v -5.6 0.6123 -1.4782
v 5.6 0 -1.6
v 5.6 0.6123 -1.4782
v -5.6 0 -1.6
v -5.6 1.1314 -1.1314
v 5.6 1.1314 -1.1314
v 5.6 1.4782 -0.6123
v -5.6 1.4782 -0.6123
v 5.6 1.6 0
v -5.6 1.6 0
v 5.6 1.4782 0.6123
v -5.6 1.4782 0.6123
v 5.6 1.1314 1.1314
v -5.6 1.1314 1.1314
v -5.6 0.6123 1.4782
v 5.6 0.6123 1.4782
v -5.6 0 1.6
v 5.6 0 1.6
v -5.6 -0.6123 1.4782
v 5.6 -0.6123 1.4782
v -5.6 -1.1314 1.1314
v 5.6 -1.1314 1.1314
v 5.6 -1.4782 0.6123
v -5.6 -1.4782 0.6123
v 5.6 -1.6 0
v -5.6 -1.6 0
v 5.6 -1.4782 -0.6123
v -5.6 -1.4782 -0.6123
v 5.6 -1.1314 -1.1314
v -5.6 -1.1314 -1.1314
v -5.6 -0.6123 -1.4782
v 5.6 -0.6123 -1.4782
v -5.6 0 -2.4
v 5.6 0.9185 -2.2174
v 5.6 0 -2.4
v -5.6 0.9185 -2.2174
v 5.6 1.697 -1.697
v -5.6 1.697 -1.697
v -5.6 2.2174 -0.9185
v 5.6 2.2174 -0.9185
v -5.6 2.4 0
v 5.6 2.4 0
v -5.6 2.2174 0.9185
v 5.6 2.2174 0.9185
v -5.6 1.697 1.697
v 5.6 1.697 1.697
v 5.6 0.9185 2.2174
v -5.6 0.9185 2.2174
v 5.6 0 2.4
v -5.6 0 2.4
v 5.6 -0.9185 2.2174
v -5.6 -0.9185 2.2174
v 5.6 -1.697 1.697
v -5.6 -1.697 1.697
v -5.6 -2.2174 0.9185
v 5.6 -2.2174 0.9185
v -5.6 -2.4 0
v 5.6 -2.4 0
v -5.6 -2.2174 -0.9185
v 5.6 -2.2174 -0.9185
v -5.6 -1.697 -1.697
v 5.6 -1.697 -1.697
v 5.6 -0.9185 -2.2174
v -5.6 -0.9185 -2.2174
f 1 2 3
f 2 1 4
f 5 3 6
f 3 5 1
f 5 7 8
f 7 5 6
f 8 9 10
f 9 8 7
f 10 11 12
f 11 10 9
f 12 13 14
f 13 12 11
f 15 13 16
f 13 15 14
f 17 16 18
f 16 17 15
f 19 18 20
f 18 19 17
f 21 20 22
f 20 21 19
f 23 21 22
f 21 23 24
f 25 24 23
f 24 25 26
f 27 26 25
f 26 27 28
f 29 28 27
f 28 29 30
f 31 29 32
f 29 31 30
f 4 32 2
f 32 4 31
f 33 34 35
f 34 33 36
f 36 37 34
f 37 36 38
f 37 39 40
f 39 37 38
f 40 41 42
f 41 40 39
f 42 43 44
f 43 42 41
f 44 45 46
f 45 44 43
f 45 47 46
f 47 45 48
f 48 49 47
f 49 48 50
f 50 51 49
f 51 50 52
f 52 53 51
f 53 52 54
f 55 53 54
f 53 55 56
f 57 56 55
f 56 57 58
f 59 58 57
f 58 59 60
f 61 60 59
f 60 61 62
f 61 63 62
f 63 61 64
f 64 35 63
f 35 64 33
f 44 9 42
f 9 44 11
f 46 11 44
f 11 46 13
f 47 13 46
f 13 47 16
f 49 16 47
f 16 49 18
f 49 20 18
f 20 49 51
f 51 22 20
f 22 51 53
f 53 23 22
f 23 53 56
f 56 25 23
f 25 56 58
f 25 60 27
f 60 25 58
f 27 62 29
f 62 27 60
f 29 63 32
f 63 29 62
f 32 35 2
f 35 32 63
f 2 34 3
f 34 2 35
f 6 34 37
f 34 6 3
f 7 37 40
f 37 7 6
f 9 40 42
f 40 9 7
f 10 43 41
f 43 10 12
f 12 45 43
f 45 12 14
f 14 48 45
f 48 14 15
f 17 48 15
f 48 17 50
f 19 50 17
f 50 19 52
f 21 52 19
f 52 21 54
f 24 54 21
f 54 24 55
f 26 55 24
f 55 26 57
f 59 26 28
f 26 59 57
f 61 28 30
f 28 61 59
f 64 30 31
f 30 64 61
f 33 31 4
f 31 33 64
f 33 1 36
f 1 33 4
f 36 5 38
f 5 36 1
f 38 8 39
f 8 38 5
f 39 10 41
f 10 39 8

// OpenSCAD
// file: ../p/4-4disc.scad
use <../lib.scad>
$fa=1; $fs=0.2;
function ldraw_lib__4_4disc(realsolid=false) = [
// 0 Disc 1.0
// 0 Name: 4-4disc.dat
// 0 Author: James Jessiman
// 0 !LDRAW_ORG Primitive UPDATE 2002-02
// 0 !LICENSE Licensed under CC BY 2.0 and CC BY 4.0 : see CAreadme.txt
// 
// 0 BFC CERTIFY CCW
  [0,"BFC","CERTIFY"],
  [0,"BFC","CCW"],
// 
// 0 !HISTORY 1998-12-15 [PTadmin] Official Update 1998-10
// 0 !HISTORY 2002-03-23 [sbliss] Added BFC statement
// 0 !HISTORY 2002-04-25 [PTadmin] Official Update 2002-02
// 0 !HISTORY 2007-06-24 [PTadmin] Header formatted for Contributor Agreement
// 0 !HISTORY 2008-07-01 [PTadmin] Official Update 2008-01
// 
// 
// 3 16 0 0 0 1 0 0 0.9239 0 0.3827
  [3,16,0,0,0,1,0,0,0.9239,0,0.3827],
// 3 16 0 0 0 0.9239 0 0.3827 0.7071 0 0.7071
  [3,16,0,0,0,0.9239,0,0.3827,0.7071,0,0.7071],
// 3 16 0 0 0 0.7071 0 0.7071 0.3827 0 0.9239
  [3,16,0,0,0,0.7071,0,0.7071,0.3827,0,0.9239],
// 3 16 0 0 0 0.3827 0 0.9239 0 0 1
  [3,16,0,0,0,0.3827,0,0.9239,0,0,1],
// 3 16 0 0 0 0 0 1 -0.3827 0 0.9239
  [3,16,0,0,0,0,0,1,-0.3827,0,0.9239],
// 3 16 0 0 0 -0.3827 0 0.9239 -0.7071 0 0.7071
  [3,16,0,0,0,-0.3827,0,0.9239,-0.7071,0,0.7071],
// 3 16 0 0 0 -0.7071 0 0.7071 -0.9239 0 0.3827
  [3,16,0,0,0,-0.7071,0,0.7071,-0.9239,0,0.3827],
// 3 16 0 0 0 -0.9239 0 0.3827 -1 0 -0
  [3,16,0,0,0,-0.9239,0,0.3827,-1,0,-0],
// 3 16 0 0 0 -1 0 -0 -0.9239 0 -0.3827
  [3,16,0,0,0,-1,0,-0,-0.9239,0,-0.3827],
// 3 16 0 0 0 -0.9239 0 -0.3827 -0.7071 0 -0.7071
  [3,16,0,0,0,-0.9239,0,-0.3827,-0.7071,0,-0.7071],
// 3 16 0 0 0 -0.7071 0 -0.7071 -0.3827 0 -0.9239
  [3,16,0,0,0,-0.7071,0,-0.7071,-0.3827,0,-0.9239],
// 3 16 0 0 0 -0.3827 0 -0.9239 0 0 -1
  [3,16,0,0,0,-0.3827,0,-0.9239,0,0,-1],
// 3 16 0 0 0 0 0 -1 0.3827 0 -0.9239
  [3,16,0,0,0,0,0,-1,0.3827,0,-0.9239],
// 3 16 0 0 0 0.3827 0 -0.9239 0.7071 0 -0.7071
  [3,16,0,0,0,0.3827,0,-0.9239,0.7071,0,-0.7071],
// 3 16 0 0 0 0.7071 0 -0.7071 0.9239 0 -0.3827
  [3,16,0,0,0,0.7071,0,-0.7071,0.9239,0,-0.3827],
// 3 16 0 0 0 0.9239 0 -0.3827 1 0 0
  [3,16,0,0,0,0.9239,0,-0.3827,1,0,0],
// 0
];
module ldraw_lib__4_4disc(step=0, col=false, unit=2/5, alt=false, line=0.2, solid=!$preview)
    makepoly(ldraw_lib__4_4disc(solid), step=step, col=col, unit=unit, alt=alt, line=line, solid=solid);
ldraw_lib__4_4disc(line=0.2);
// file: ../p/stud3.scad
use <../lib.scad>
use <4-4cyli.scad>
use <4-4disc.scad>
use <4-4edge.scad>
$fa=1; $fs=0.2;
function ldraw_lib__stud3(realsolid=false) = realsolid ? 
    [openscad(translate([0,0,-eps()], o=cylinder(4+eps(), r=4)),2)] : [
// 0 Stud Tube Solid
// 0 Name: stud3.dat
// 0 Author: James Jessiman
// 0 !LDRAW_ORG Primitive UPDATE 2012-01
// 0 !LICENSE Licensed under CC BY 2.0 and CC BY 4.0 : see CAreadme.txt
// 
// 0 BFC CERTIFY CCW
  [0,"BFC","CERTIFY"],
  [0,"BFC","CCW"],
// 
// 0 !HISTORY 2002-04-04 [sbliss] Modified for BFC compliance
// 0 !HISTORY 2002-04-25 [PTadmin] Official Update 2002-02
// 0 !HISTORY 2007-06-24 [PTadmin] Header formatted for Contributor Agreement
// 0 !HISTORY 2008-07-01 [PTadmin] Official Update 2008-01
// 0 !HISTORY 2012-02-16 [Philo] Changed to CCW
// 0 !HISTORY 2012-03-30 [PTadmin] Official Update 2012-01
// 
// 
// 1 16 0 -4 0 4 0 0 0 1 0 0 0 4 4-4edge.dat
  [1,16,0,-4,0,4,0,0,0,1,0,0,0,4, ldraw_lib__4_4edge(realsolid)],
// 1 16 0 0 0 4 0 0 0 1 0 0 0 4 4-4edge.dat
  [1,16,0,0,0,4,0,0,0,1,0,0,0,4, ldraw_lib__4_4edge(realsolid)],
// 1 16 0 -4 0 4 0 0 0 1 0 0 0 4 4-4disc.dat
  [1,16,0,-4,0,4,0,0,0,1,0,0,0,4, ldraw_lib__4_4disc(realsolid)],
// 1 16 0 -4 0 4 0 0 0 4 0 0 0 4 4-4cyli.dat
  [1,16,0,-4,0,4,0,0,0,4,0,0,0,4, ldraw_lib__4_4cyli(realsolid)],
];
module ldraw_lib__stud3(step=0, col=false, unit=2/5, alt=false, line=0.2, solid=!$preview)
    makepoly(ldraw_lib__stud3(solid), step=step, col=col, unit=unit, alt=alt, line=line, solid=solid);
ldraw_lib__stud3(line=0.2);
// file: ../p/stud.scad
use <../lib.scad>
use <4-4cyli.scad>
use <4-4disc.scad>
use <4-4edge.scad>
$fa=1; $fs=0.2;
function ldraw_lib__stud(realsolid=false) = realsolid ? 
    [openscad(translate([0,0,-eps()], o=cylinder(4+eps(), r=6)),2)] : [
// 0 Stud
// 0 Name: stud.dat
// 0 Author: James Jessiman
// 0 !LDRAW_ORG Primitive UPDATE 2012-01
// 0 !LICENSE Licensed under CC BY 2.0 and CC BY 4.0 : see CAreadme.txt
// 
// 0 BFC CERTIFY CCW
  [0,"BFC","CERTIFY"],
  [0,"BFC","CCW"],
// 
// 0 !HISTORY 2002-04-04 [sbliss] Modified for BFC compliance
// 0 !HISTORY 2002-04-25 [PTadmin] Official Update 2002-02
// 0 !HISTORY 2007-06-24 [PTadmin] Header formatted for Contributor Agreement
// 0 !HISTORY 2008-07-01 [PTadmin] Official Update 2008-01
// 0 !HISTORY 2012-02-16 [Philo] Changed to CCW
// 0 !HISTORY 2012-03-30 [PTadmin] Official Update 2012-01
// 
// 
// 1 16 0 0 0 6 0 0 0 1 0 0 0 6 4-4edge.dat
  [1,16,0,0,0,6,0,0,0,1,0,0,0,6, ldraw_lib__4_4edge(realsolid)],
// 1 16 0 -4 0 6 0 0 0 1 0 0 0 6 4-4edge.dat
  [1,16,0,-4,0,6,0,0,0,1,0,0,0,6, ldraw_lib__4_4edge(realsolid)],
// 1 16 0 0 0 6 0 0 0 -4 0 0 0 6 4-4cyli.dat
  [1,16,0,0,0,6,0,0,0,-4,0,0,0,6, ldraw_lib__4_4cyli(realsolid)],
// 1 16 0 -4 0 6 0 0 0 1 0 0 0 6 4-4disc.dat
  [1,16,0,-4,0,6,0,0,0,1,0,0,0,6, ldraw_lib__4_4disc(realsolid)],
];
module ldraw_lib__stud(step=0, col=false, unit=2/5, alt=false, line=0.2, solid=!$preview)
    makepoly(ldraw_lib__stud(solid), step=step, col=col, unit=unit, alt=alt, line=line, solid=solid);
ldraw_lib__stud(line=0.2);
// file: ../p/box5.scad
use <../lib.scad>
$fa=1; $fs=0.2;
function ldraw_lib__box5(realsolid=false) = [
// 0 Box with 5 Faces and All Edges
// 0 Name: box5.dat
// 0 Author: James Jessiman
// 0 !LDRAW_ORG Primitive UPDATE 2012-01
// 0 !LICENSE Licensed under CC BY 2.0 and CC BY 4.0 : see CAreadme.txt
// 
// 0 BFC CERTIFY CCW
  [0,"BFC","CERTIFY"],
  [0,"BFC","CCW"],
// 
// 0 !HISTORY 2002-04-03 [sbliss] Modified for BFC compliance
// 0 !HISTORY 2002-04-25 [PTadmin] Official Update 2002-02
// 0 !HISTORY 2007-06-24 [PTadmin] Header formatted for Contributor Agreement
// 0 !HISTORY 2008-07-01 [PTadmin] Official Update 2008-01
// 0 !HISTORY 2012-02-16 [Philo] Changed to CCW
// 0 !HISTORY 2012-03-30 [PTadmin] Official Update 2012-01
// 
// 
// 2 24 1 1 1 -1 1 1
  [2,24,1,1,1,-1,1,1],
// 2 24 -1 1 1 -1 1 -1
  [2,24,-1,1,1,-1,1,-1],
// 2 24 -1 1 -1 1 1 -1
  [2,24,-1,1,-1,1,1,-1],
// 2 24 1 1 -1 1 1 1
  [2,24,1,1,-1,1,1,1],
// 2 24 1 0 1 -1 0 1
  [2,24,1,0,1,-1,0,1],
// 2 24 -1 0 1 -1 0 -1
  [2,24,-1,0,1,-1,0,-1],
// 2 24 -1 0 -1 1 0 -1
  [2,24,-1,0,-1,1,0,-1],
// 2 24 1 0 -1 1 0 1
  [2,24,1,0,-1,1,0,1],
// 2 24 1 0 1 1 1 1
  [2,24,1,0,1,1,1,1],
// 2 24 -1 0 1 -1 1 1
  [2,24,-1,0,1,-1,1,1],
// 2 24 1 0 -1 1 1 -1
  [2,24,1,0,-1,1,1,-1],
// 2 24 -1 0 -1 -1 1 -1
  [2,24,-1,0,-1,-1,1,-1],
// 4 16 -1 1 1 1 1 1 1 1 -1 -1 1 -1
  [4,16,-1,1,1,1,1,1,1,1,-1,-1,1,-1],
// 4 16 -1 1 1 -1 0 1 1 0 1 1 1 1
  [4,16,-1,1,1,-1,0,1,1,0,1,1,1,1],
// 4 16 -1 1 -1 -1 0 -1 -1 0 1 -1 1 1
  [4,16,-1,1,-1,-1,0,-1,-1,0,1,-1,1,1],
// 4 16 1 1 -1 1 0 -1 -1 0 -1 -1 1 -1
  [4,16,1,1,-1,1,0,-1,-1,0,-1,-1,1,-1],
// 4 16 1 1 1 1 0 1 1 0 -1 1 1 -1
  [4,16,1,1,1,1,0,1,1,0,-1,1,1,-1],
];
module ldraw_lib__box5(step=0, col=false, unit=2/5, alt=false, line=0.2, solid=!$preview)
    makepoly(ldraw_lib__box5(solid), step=step, col=col, unit=unit, alt=alt, line=line, solid=solid);
ldraw_lib__box5(line=0.2);
// file: ../p/box4t.scad
use <../lib.scad>
$fa=1; $fs=0.2;
function ldraw_lib__box4t(realsolid=false) = [
// 0 Box with 4 Adjacent Faces and All Edges
// 0 Name: box4t.dat
// 0 Author: Tore Eriksson [Tore_Eriksson]
// 0 !LDRAW_ORG Primitive UPDATE 2003-02
// 0 !LICENSE Licensed under CC BY 2.0 and CC BY 4.0 : see CAreadme.txt
// 
// 0 BFC CERTIFY CCW
  [0,"BFC","CERTIFY"],
  [0,"BFC","CCW"],
// 
// 0 !HISTORY 1997-09-29 [PTadmin] Official Update 1997-15
// 0 !HISTORY 2002-08-31 [izanette] Modified with WINDZ for BFC compliance
// 0 !HISTORY 2003-08-01 [PTadmin] Official Update 2003-02
// 0 !HISTORY 2007-06-24 [PTadmin] Header formatted for Contributor Agreement
// 0 !HISTORY 2008-07-01 [PTadmin] Official Update 2008-01
// 
// 
// 2 24 1 1 1 -1 1 1
  [2,24,1,1,1,-1,1,1],
// 2 24 -1 1 1 -1 1 -1
  [2,24,-1,1,1,-1,1,-1],
// 2 24 -1 1 -1 1 1 -1
  [2,24,-1,1,-1,1,1,-1],
// 2 24 1 1 -1 1 1 1
  [2,24,1,1,-1,1,1,1],
// 2 24 1 0 1 -1 0 1
  [2,24,1,0,1,-1,0,1],
// 2 24 -1 0 1 -1 0 -1
  [2,24,-1,0,1,-1,0,-1],
// 2 24 -1 0 -1 1 0 -1
  [2,24,-1,0,-1,1,0,-1],
// 2 24 1 0 -1 1 0 1
  [2,24,1,0,-1,1,0,1],
// 2 24 1 0 1 1 1 1
  [2,24,1,0,1,1,1,1],
// 2 24 -1 0 1 -1 1 1
  [2,24,-1,0,1,-1,1,1],
// 2 24 1 0 -1 1 1 -1
  [2,24,1,0,-1,1,1,-1],
// 2 24 -1 0 -1 -1 1 -1
  [2,24,-1,0,-1,-1,1,-1],
// 4 16 1 1 1 1 1 -1 -1 1 -1 -1 1 1
  [4,16,1,1,1,1,1,-1,-1,1,-1,-1,1,1],
// 4 16 1 1 1 -1 1 1 -1 0 1 1 0 1
  [4,16,1,1,1,-1,1,1,-1,0,1,1,0,1],
// 4 16 -1 1 1 -1 1 -1 -1 0 -1 -1 0 1
  [4,16,-1,1,1,-1,1,-1,-1,0,-1,-1,0,1],
// 0 4 16 -1 1 -1 -1 0 -1 1 0 -1 1 1 -1
// 4 16 1 1 -1 1 1 1 1 0 1 1 0 -1
  [4,16,1,1,-1,1,1,1,1,0,1,1,0,-1],
// 0
];
module ldraw_lib__box4t(step=0, col=false, unit=2/5, alt=false, line=0.2, solid=!$preview)
    makepoly(ldraw_lib__box4t(solid), step=step, col=col, unit=unit, alt=alt, line=line, solid=solid);
ldraw_lib__box4t(line=0.2);
// file: s/3004s01.scad
use <../../lib.scad>
use <../../p/box4t.scad>
use <../../p/box5.scad>
use <../../p/stud.scad>
use <../../p/stud3.scad>
$fa=1; $fs=0.2;
function ldraw_lib__s__3004s01(realsolid=false) = [
// 0 ~Brick  1 x  2 without Front Face
// 0 Name: s\3004s01.dat
// 0 Author: James Jessiman
// 0 !LDRAW_ORG Subpart UPDATE 2003-03
// 0 !LICENSE Licensed under CC BY 2.0 and CC BY 4.0 : see CAreadme.txt
// 
// 0 BFC CERTIFY CCW
  [0,"BFC","CERTIFY"],
  [0,"BFC","CCW"],
// 
// 0 !HISTORY 2003-09-07 [jriley] Subfiling, BFC
// 0 !HISTORY 2003-12-19 [PTadmin] Official Update 2003-03
// 0 !HISTORY 2007-08-29 [PTadmin] Header formatted for Contributor Agreement
// 0 !HISTORY 2008-07-01 [PTadmin] Official Update 2008-01
// 
// 
// 1 16 0 4 0 1 0 0 0 -5 0 0 0 1 stud3.dat
  [1,16,0,4,0,1,0,0,0,-5,0,0,0,1, ldraw_lib__stud3(realsolid)],
// 0 BFC INVERTNEXT
  [0,"BFC","INVERTNEXT"],
// 1 16 0 24 0 16 0 0 0 -20 0 0 0 6 box5.dat
  [1,16,0,24,0,16,0,0,0,-20,0,0,0,6, ldraw_lib__box5(realsolid)],
// 4 16 20 24 10 16 24 6 -16 24 6 -20 24 10
  [4,16,20,24,10,16,24,6,-16,24,6,-20,24,10],
// 4 16 -20 24 10 -16 24 6 -16 24 -6 -20 24 -10
  [4,16,-20,24,10,-16,24,6,-16,24,-6,-20,24,-10],
// 4 16 -20 24 -10 -16 24 -6 16 24 -6 20 24 -10
  [4,16,-20,24,-10,-16,24,-6,16,24,-6,20,24,-10],
// 4 16 20 24 -10 16 24 -6 16 24 6 20 24 10
  [4,16,20,24,-10,16,24,-6,16,24,6,20,24,10],
// 1 16 0 24 0 20 0 0 0 -24 0 0 0 10 box4t.dat
  [1,16,0,24,0,20,0,0,0,-24,0,0,0,10, ldraw_lib__box4t(realsolid)],
// 1 16 10 0 0 1 0 0 0 1 0 0 0 1 stud.dat
  [1,16,10,0,0,1,0,0,0,1,0,0,0,1, ldraw_lib__stud(realsolid)],
// 1 16 -10 0 0 1 0 0 0 1 0 0 0 1 stud.dat
  [1,16,-10,0,0,1,0,0,0,1,0,0,0,1, ldraw_lib__stud(realsolid)],
// 0
];
module ldraw_lib__s__3004s01(step=0, col=false, unit=2/5, alt=false, line=0.2, solid=!$preview)
    makepoly(ldraw_lib__s__3004s01(solid), step=step, col=col, unit=unit, alt=alt, line=line, solid=solid);
ldraw_lib__s__3004s01(line=0.2);
// file: ../p/4-4ring2.scad
use <../lib.scad>
$fa=1; $fs=0.2;
function ldraw_lib__4_4ring2(realsolid=false) = [
// 0 Ring  2 x 1.0
// 0 Name: 4-4ring2.dat
// 0 Author: James Jessiman
// 0 !LDRAW_ORG Primitive UPDATE 2009-01
// 0 !LICENSE Licensed under CC BY 2.0 and CC BY 4.0 : see CAreadme.txt
// 
// 0 BFC CERTIFY CCW
  [0,"BFC","CERTIFY"],
  [0,"BFC","CCW"],
// 
// 0 !HISTORY 1998-12-15 [PTadmin] Official Update 1998-10
// 0 !HISTORY 2002-04-05 [hafhead] Added BFC statement
// 0 !HISTORY 2002-04-25 [PTadmin] Official Update 2002-02
// 0 !HISTORY 2007-06-24 [PTadmin] Header formatted for Contributor Agreement
// 0 !HISTORY 2008-07-01 [PTadmin] Official Update 2008-01
// 0 !HISTORY 2008-08-26 [cwdee] Switch polygon winding and rename
// 0 !HISTORY 2009-05-02 [PTadmin] Official Update 2009-01
// 
// 
// 4 16 -1.1481 0 2.7717 -0.7654 0 1.8478 0 0 2 0 0 3
  [4,16,-1.1481,0,2.7717,-0.7654,0,1.8478,0,0,2,0,0,3],
// 4 16 -2.1213 0 2.1213 -1.4142 0 1.4142 -0.7654 0 1.8478 -1.1481 0 2.7717
  [4,16,-2.1213,0,2.1213,-1.4142,0,1.4142,-0.7654,0,1.8478,-1.1481,0,2.7717],
// 4 16 -2.7717 0 1.1481 -1.8478 0 0.7654 -1.4142 0 1.4142 -2.1213 0 2.1213
  [4,16,-2.7717,0,1.1481,-1.8478,0,0.7654,-1.4142,0,1.4142,-2.1213,0,2.1213],
// 4 16 -3 0 0 -2 0 0 -1.8478 0 0.7654 -2.7717 0 1.1481
  [4,16,-3,0,0,-2,0,0,-1.8478,0,0.7654,-2.7717,0,1.1481],
// 4 16 -2.7717 0 -1.1481 -1.8478 0 -0.7654 -2 0 0 -3 0 0
  [4,16,-2.7717,0,-1.1481,-1.8478,0,-0.7654,-2,0,0,-3,0,0],
// 4 16 -2.1213 0 -2.1213 -1.4142 0 -1.4142 -1.8478 0 -0.7654 -2.7717 0 -1.1481
  [4,16,-2.1213,0,-2.1213,-1.4142,0,-1.4142,-1.8478,0,-0.7654,-2.7717,0,-1.1481],
// 4 16 -1.1481 0 -2.7717 -0.7654 0 -1.8478 -1.4142 0 -1.4142 -2.1213 0 -2.1213
  [4,16,-1.1481,0,-2.7717,-0.7654,0,-1.8478,-1.4142,0,-1.4142,-2.1213,0,-2.1213],
// 4 16 0 0 -3 0 0 -2 -0.7654 0 -1.8478 -1.1481 0 -2.7717
  [4,16,0,0,-3,0,0,-2,-0.7654,0,-1.8478,-1.1481,0,-2.7717],
// 4 16 1.1481 0 -2.7717 0.7654 0 -1.8478 0 0 -2 0 0 -3
  [4,16,1.1481,0,-2.7717,0.7654,0,-1.8478,0,0,-2,0,0,-3],
// 4 16 2.1213 0 -2.1213 1.4142 0 -1.4142 0.7654 0 -1.8478 1.1481 0 -2.7717
  [4,16,2.1213,0,-2.1213,1.4142,0,-1.4142,0.7654,0,-1.8478,1.1481,0,-2.7717],
// 4 16 2.7717 0 -1.1481 1.8478 0 -0.7654 1.4142 0 -1.4142 2.1213 0 -2.1213
  [4,16,2.7717,0,-1.1481,1.8478,0,-0.7654,1.4142,0,-1.4142,2.1213,0,-2.1213],
// 4 16 3 0 0 2 0 0 1.8478 0 -0.7654 2.7717 0 -1.1481
  [4,16,3,0,0,2,0,0,1.8478,0,-0.7654,2.7717,0,-1.1481],
// 4 16 2.7717 0 1.1481 1.8478 0 0.7654 2 0 0 3 0 0
  [4,16,2.7717,0,1.1481,1.8478,0,0.7654,2,0,0,3,0,0],
// 4 16 2.1213 0 2.1213 1.4142 0 1.4142 1.8478 0 0.7654 2.7717 0 1.1481
  [4,16,2.1213,0,2.1213,1.4142,0,1.4142,1.8478,0,0.7654,2.7717,0,1.1481],
// 4 16 1.1481 0 2.7717 0.7654 0 1.8478 1.4142 0 1.4142 2.1213 0 2.1213
  [4,16,1.1481,0,2.7717,0.7654,0,1.8478,1.4142,0,1.4142,2.1213,0,2.1213],
// 4 16 0 0 3 0 0 2 0.7654 0 1.8478 1.1481 0 2.7717
  [4,16,0,0,3,0,0,2,0.7654,0,1.8478,1.1481,0,2.7717],
// 0
];
module ldraw_lib__4_4ring2(step=0, col=false, unit=2/5, alt=false, line=0.2, solid=!$preview)
    makepoly(ldraw_lib__4_4ring2(solid), step=step, col=col, unit=unit, alt=alt, line=line, solid=solid);
ldraw_lib__4_4ring2(line=0.2);
// file: ../p/4-4edge.scad
use <../lib.scad>
$fa=1; $fs=0.2;
function ldraw_lib__4_4edge(realsolid=false) = [
// 0 Circle 1.0
// 0 Name: 4-4edge.dat
// 0 Author: James Jessiman
// 0 !LDRAW_ORG Primitive UPDATE 2017-01
// 0 !LICENSE Licensed under CC BY 2.0 and CC BY 4.0 : see CAreadme.txt
// 
// 0 BFC CERTIFY CCW
  [0,"BFC","CERTIFY"],
  [0,"BFC","CCW"],
// 
// 0 !HISTORY 1998-12-15 [PTadmin] Official Update 1998-10
// 0 !HISTORY 2005-12-28 [PTadmin] Official Update 2005-01
// 0 !HISTORY 2007-06-24 [PTadmin] Header formatted for Contributor Agreement
// 0 !HISTORY 2008-07-01 [PTadmin] Official Update 2008-01
// 0 !HISTORY 2017-01-15 [Steffen] BFCed
// 0 !HISTORY 2017-12-30 [PTadmin] Official Update 2017-01
// 
// 
// 2 24 1 0 0 0.9239 0 0.3827
  [2,24,1,0,0,0.9239,0,0.3827],
// 2 24 0.9239 0 0.3827 0.7071 0 0.7071
  [2,24,0.9239,0,0.3827,0.7071,0,0.7071],
// 2 24 0.7071 0 0.7071 0.3827 0 0.9239
  [2,24,0.7071,0,0.7071,0.3827,0,0.9239],
// 2 24 0.3827 0 0.9239 0 0 1
  [2,24,0.3827,0,0.9239,0,0,1],
// 2 24 0 0 1 -0.3827 0 0.9239
  [2,24,0,0,1,-0.3827,0,0.9239],
// 2 24 -0.3827 0 0.9239 -0.7071 0 0.7071
  [2,24,-0.3827,0,0.9239,-0.7071,0,0.7071],
// 2 24 -0.7071 0 0.7071 -0.9239 0 0.3827
  [2,24,-0.7071,0,0.7071,-0.9239,0,0.3827],
// 2 24 -0.9239 0 0.3827 -1 0 -0
  [2,24,-0.9239,0,0.3827,-1,0,-0],
// 2 24 -1 0 -0 -0.9239 0 -0.3827
  [2,24,-1,0,-0,-0.9239,0,-0.3827],
// 2 24 -0.9239 0 -0.3827 -0.7071 0 -0.7071
  [2,24,-0.9239,0,-0.3827,-0.7071,0,-0.7071],
// 2 24 -0.7071 0 -0.7071 -0.3827 0 -0.9239
  [2,24,-0.7071,0,-0.7071,-0.3827,0,-0.9239],
// 2 24 -0.3827 0 -0.9239 0 0 -1
  [2,24,-0.3827,0,-0.9239,0,0,-1],
// 2 24 0 0 -1 0.3827 0 -0.9239
  [2,24,0,0,-1,0.3827,0,-0.9239],
// 2 24 0.3827 0 -0.9239 0.7071 0 -0.7071
  [2,24,0.3827,0,-0.9239,0.7071,0,-0.7071],
// 2 24 0.7071 0 -0.7071 0.9239 0 -0.3827
  [2,24,0.7071,0,-0.7071,0.9239,0,-0.3827],
// 2 24 0.9239 0 -0.3827 1 0 0
  [2,24,0.9239,0,-0.3827,1,0,0],
];
module ldraw_lib__4_4edge(step=0, col=false, unit=2/5, alt=false, line=0.2, solid=!$preview)
    makepoly(ldraw_lib__4_4edge(solid), step=step, col=col, unit=unit, alt=alt, line=line, solid=solid);
ldraw_lib__4_4edge(line=0.2);
// file: ../p/4-4cyli.scad
use <../lib.scad>
$fa=1; $fs=0.2;
function ldraw_lib__4_4cyli(realsolid=false) = [
// 0 Cylinder 1.0
// 0 Name: 4-4cyli.dat
// 0 Author: James Jessiman
// 0 !LDRAW_ORG Primitive UPDATE 2005-01
// 0 !LICENSE Licensed under CC BY 2.0 and CC BY 4.0 : see CAreadme.txt
// 
// 0 BFC CERTIFY CCW
  [0,"BFC","CERTIFY"],
  [0,"BFC","CCW"],
// 
// 0 !HISTORY 1998-12-15 [PTadmin] Official Update 1998-10
// 0 !HISTORY 2002-03-23 [sbliss] Added BFC statement; merged headers from files in distributions LDraw 0.27 and Complete.
// 0 !HISTORY 2002-04-25 [PTadmin] Official Update 2002-02
// 0 !HISTORY 2004-12-14 [guyvivan] BFC CCW
// 0 !HISTORY 2005-12-28 [PTadmin] Official Update 2005-01
// 0 !HISTORY 2007-06-24 [PTadmin] Header formatted for Contributor Agreement
// 0 !HISTORY 2008-07-01 [PTadmin] Official Update 2008-01
// 
// 
// 4 16 1 1 0 0.9239 1 0.3827 0.9239 0 0.3827 1 0 0
  [4,16,1,1,0,0.9239,1,0.3827,0.9239,0,0.3827,1,0,0],
// 5 24 1 0 0 1 1 0 0.9239 0 0.3827 0.9239 0 -0.3827
  [5,24,1,0,0,1,1,0,0.9239,0,0.3827,0.9239,0,-0.3827],
// 4 16 0.9239 1 0.3827 0.7071 1 0.7071 0.7071 0 0.7071 0.9239 0 0.3827
  [4,16,0.9239,1,0.3827,0.7071,1,0.7071,0.7071,0,0.7071,0.9239,0,0.3827],
// 5 24 0.9239 0 0.3827 0.9239 1 0.3827 0.7071 0 0.7071 1 0 0
  [5,24,0.9239,0,0.3827,0.9239,1,0.3827,0.7071,0,0.7071,1,0,0],
// 4 16 0.7071 1 0.7071 0.3827 1 0.9239 0.3827 0 0.9239 0.7071 0 0.7071
  [4,16,0.7071,1,0.7071,0.3827,1,0.9239,0.3827,0,0.9239,0.7071,0,0.7071],
// 5 24 0.7071 0 0.7071 0.7071 1 0.7071 0.3827 0 0.9239 0.9239 0 0.3827
  [5,24,0.7071,0,0.7071,0.7071,1,0.7071,0.3827,0,0.9239,0.9239,0,0.3827],
// 4 16 0.3827 1 0.9239 0 1 1 0 0 1 0.3827 0 0.9239
  [4,16,0.3827,1,0.9239,0,1,1,0,0,1,0.3827,0,0.9239],
// 5 24 0.3827 0 0.9239 0.3827 1 0.9239 0 0 1 0.7071 0 0.7071
  [5,24,0.3827,0,0.9239,0.3827,1,0.9239,0,0,1,0.7071,0,0.7071],
// 4 16 0 1 1 -0.3827 1 0.9239 -0.3827 0 0.9239 0 0 1
  [4,16,0,1,1,-0.3827,1,0.9239,-0.3827,0,0.9239,0,0,1],
// 5 24 0 0 1 0 1 1 -0.3827 0 0.9239 0.3827 0 0.9239
  [5,24,0,0,1,0,1,1,-0.3827,0,0.9239,0.3827,0,0.9239],
// 4 16 -0.3827 1 0.9239 -0.7071 1 0.7071 -0.7071 0 0.7071 -0.3827 0 0.9239
  [4,16,-0.3827,1,0.9239,-0.7071,1,0.7071,-0.7071,0,0.7071,-0.3827,0,0.9239],
// 5 24 -0.3827 0 0.9239 -0.3827 1 0.9239 -0.7071 0 0.7071 0 0 1
  [5,24,-0.3827,0,0.9239,-0.3827,1,0.9239,-0.7071,0,0.7071,0,0,1],
// 4 16 -0.7071 1 0.7071 -0.9239 1 0.3827 -0.9239 0 0.3827 -0.7071 0 0.7071
  [4,16,-0.7071,1,0.7071,-0.9239,1,0.3827,-0.9239,0,0.3827,-0.7071,0,0.7071],
// 5 24 -0.7071 0 0.7071 -0.7071 1 0.7071 -0.9239 0 0.3827 -0.3827 0 0.9239
  [5,24,-0.7071,0,0.7071,-0.7071,1,0.7071,-0.9239,0,0.3827,-0.3827,0,0.9239],
// 4 16 -0.9239 1 0.3827 -1 1 0 -1 0 0 -0.9239 0 0.3827
  [4,16,-0.9239,1,0.3827,-1,1,0,-1,0,0,-0.9239,0,0.3827],
// 5 24 -0.9239 0 0.3827 -0.9239 1 0.3827 -1 0 0 -0.7071 0 0.7071
  [5,24,-0.9239,0,0.3827,-0.9239,1,0.3827,-1,0,0,-0.7071,0,0.7071],
// 4 16 -1 1 0 -0.9239 1 -0.3827 -0.9239 0 -0.3827 -1 0 0
  [4,16,-1,1,0,-0.9239,1,-0.3827,-0.9239,0,-0.3827,-1,0,0],
// 5 24 -1 0 0 -1 1 0 -0.9239 0 -0.3827 -0.9239 0 0.3827
  [5,24,-1,0,0,-1,1,0,-0.9239,0,-0.3827,-0.9239,0,0.3827],
// 4 16 -0.9239 1 -0.3827 -0.7071 1 -0.7071 -0.7071 0 -0.7071 -0.9239 0 -0.3827
  [4,16,-0.9239,1,-0.3827,-0.7071,1,-0.7071,-0.7071,0,-0.7071,-0.9239,0,-0.3827],
// 5 24 -0.9239 0 -0.3827 -0.9239 1 -0.3827 -0.7071 0 -0.7071 -1 0 0
  [5,24,-0.9239,0,-0.3827,-0.9239,1,-0.3827,-0.7071,0,-0.7071,-1,0,0],
// 4 16 -0.7071 1 -0.7071 -0.3827 1 -0.9239 -0.3827 0 -0.9239 -0.7071 0 -0.7071
  [4,16,-0.7071,1,-0.7071,-0.3827,1,-0.9239,-0.3827,0,-0.9239,-0.7071,0,-0.7071],
// 5 24 -0.7071 0 -0.7071 -0.7071 1 -0.7071 -0.3827 0 -0.9239 -0.9239 0 -0.3827
  [5,24,-0.7071,0,-0.7071,-0.7071,1,-0.7071,-0.3827,0,-0.9239,-0.9239,0,-0.3827],
// 4 16 -0.3827 1 -0.9239 0 1 -1 0 0 -1 -0.3827 0 -0.9239
  [4,16,-0.3827,1,-0.9239,0,1,-1,0,0,-1,-0.3827,0,-0.9239],
// 5 24 -0.3827 0 -0.9239 -0.3827 1 -0.9239 0 0 -1 -0.7071 0 -0.7071
  [5,24,-0.3827,0,-0.9239,-0.3827,1,-0.9239,0,0,-1,-0.7071,0,-0.7071],
// 4 16 0 1 -1 0.3827 1 -0.9239 0.3827 0 -0.9239 0 0 -1
  [4,16,0,1,-1,0.3827,1,-0.9239,0.3827,0,-0.9239,0,0,-1],
// 5 24 0 0 -1 0 1 -1 0.3827 0 -0.9239 -0.3827 0 -0.9239
  [5,24,0,0,-1,0,1,-1,0.3827,0,-0.9239,-0.3827,0,-0.9239],
// 4 16 0.3827 1 -0.9239 0.7071 1 -0.7071 0.7071 0 -0.7071 0.3827 0 -0.9239
  [4,16,0.3827,1,-0.9239,0.7071,1,-0.7071,0.7071,0,-0.7071,0.3827,0,-0.9239],
// 5 24 0.3827 0 -0.9239 0.3827 1 -0.9239 0.7071 0 -0.7071 0 0 -1
  [5,24,0.3827,0,-0.9239,0.3827,1,-0.9239,0.7071,0,-0.7071,0,0,-1],
// 4 16 0.7071 1 -0.7071 0.9239 1 -0.3827 0.9239 0 -0.3827 0.7071 0 -0.7071
  [4,16,0.7071,1,-0.7071,0.9239,1,-0.3827,0.9239,0,-0.3827,0.7071,0,-0.7071],
// 5 24 0.7071 0 -0.7071 0.7071 1 -0.7071 0.9239 0 -0.3827 0.3827 0 -0.9239
  [5,24,0.7071,0,-0.7071,0.7071,1,-0.7071,0.9239,0,-0.3827,0.3827,0,-0.9239],
// 4 16 0.9239 1 -0.3827 1 1 0 1 0 0 0.9239 0 -0.3827
  [4,16,0.9239,1,-0.3827,1,1,0,1,0,0,0.9239,0,-0.3827],
// 5 24 0.9239 0 -0.3827 0.9239 1 -0.3827 1 0 0 0.7071 0 -0.7071
  [5,24,0.9239,0,-0.3827,0.9239,1,-0.3827,1,0,0,0.7071,0,-0.7071],
// 0
];
module ldraw_lib__4_4cyli(step=0, col=false, unit=2/5, alt=false, line=0.2, solid=!$preview)
    makepoly(ldraw_lib__4_4cyli(solid), step=step, col=col, unit=unit, alt=alt, line=line, solid=solid);
ldraw_lib__4_4cyli(line=0.2);
// file: 3004.scad
use <../lib.scad>
use <s/3004s01.scad>
$fa=1; $fs=0.2;
function ldraw_lib__3004(realsolid=false) = [
// 0 Brick  1 x  2
// 0 Name: 3004.dat
// 0 Author: James Jessiman
// 0 !LDRAW_ORG Part UPDATE 2022-05
// 0 !LICENSE Licensed under CC BY 2.0 and CC BY 4.0 : see CAreadme.txt
// 
// 0 BFC CERTIFY CCW
  [0,"BFC","CERTIFY"],
  [0,"BFC","CCW"],
// 
// 0 !HISTORY 2001-10-26 [PTadmin] Official Update 2001-01
// 0 !HISTORY 2002-05-07 {unknown} BFC Certification
// 0 !HISTORY 2002-06-11 [PTadmin] Official Update 2002-03
// 0 !HISTORY 2007-05-07 [PTadmin] Header formatted for Contributor Agreement
// 0 !HISTORY 2008-07-01 [PTadmin] Official Update 2008-01
// 0 !HISTORY 2022-08-04 [MagFors] Using subfile
// 0 !HISTORY 2022-09-15 [PTadmin] Official Update 2022-05
// 
// 
// 1 16 0 0 0 1 0 0 0 1 0 0 0 1 s\3004s01.dat
  [1,16,0,0,0,1,0,0,0,1,0,0,0,1, ldraw_lib__s__3004s01(realsolid)],
// 4 16 -20 24 -10 20 24 -10 20 0 -10 -20 0 -10
  [4,16,-20,24,-10,20,24,-10,20,0,-10,-20,0,-10],
];
module ldraw_lib__3004(step=0, col=false, unit=2/5, alt=false, line=0.2, solid=!$preview)
    makepoly(ldraw_lib__3004(solid), step=step, col=col, unit=unit, alt=alt, line=line, solid=solid);
ldraw_lib__3004(line=0.2);
// file: 3111.scad
use <../lib.scad>
use <../p/4-4cyli.scad>
use <../p/4-4edge.scad>
use <../p/4-4ring2.scad>
$fa=1; $fs=0.2;
function ldraw_lib__3111(realsolid=false) = [
// 0 ~Axle Bush 1.4L
// 0 Name: 3111.dat
// 0 Author: James Jessiman
// 0 !LDRAW_ORG Part UPDATE 2018-02
// 0 !LICENSE Licensed under CC BY 2.0 and CC BY 4.0 : see CAreadme.txt
// 
// 0 BFC CERTIFY CW
  [0,"BFC","CERTIFY"],
  [0,"BFC","CW"],
// 
// 0 !CATEGORY Wheel
// 
// 0 !HISTORY 2007-06-25 [PTadmin] Header formatted for Contributor Agreement
// 0 !HISTORY 2008-07-01 [PTadmin] Official Update 2008-01
// 0 !HISTORY 2008-07-07 [mkennedy] Completed header, BFC'ed, Optimized
// 0 !HISTORY 2008-08-23 [PTadmin] Renamed from 34d
// 0 !HISTORY 2009-05-02 [PTadmin] Official Update 2009-01
// 0 !HISTORY 2018-11-24 [cwdee] Update description
// 0 !HISTORY 2018-12-08 [PTadmin] Official Update 2018-02
// 
// 
// 0 BFC INVERTNEXT
  [0,"BFC","INVERTNEXT"],
// 1 16 14 0 0 0 -28 0 4 0 0 0 0 4 4-4cyli.dat
  [1,16,14,0,0,0,-28,0,4,0,0,0,0,4, ldraw_lib__4_4cyli(realsolid)],
// 1 16 14 0 0 0 -28 0 6 0 0 0 0 6 4-4cyli.dat
  [1,16,14,0,0,0,-28,0,6,0,0,0,0,6, ldraw_lib__4_4cyli(realsolid)],
// 1 16 14 0 0 0 1 0 4 0 0 0 0 4 4-4edge.dat
  [1,16,14,0,0,0,1,0,4,0,0,0,0,4, ldraw_lib__4_4edge(realsolid)],
// 1 16 -14 0 0 0 1 0 4 0 0 0 0 4 4-4edge.dat
  [1,16,-14,0,0,0,1,0,4,0,0,0,0,4, ldraw_lib__4_4edge(realsolid)],
// 1 16 14 0 0 0 1 0 6 0 0 0 0 6 4-4edge.dat
  [1,16,14,0,0,0,1,0,6,0,0,0,0,6, ldraw_lib__4_4edge(realsolid)],
// 1 16 -14 0 0 0 1 0 6 0 0 0 0 6 4-4edge.dat
  [1,16,-14,0,0,0,1,0,6,0,0,0,0,6, ldraw_lib__4_4edge(realsolid)],
// 1 16 14 0 0 0 -1 0 2 0 0 0 0 2 4-4ring2.dat
  [1,16,14,0,0,0,-1,0,2,0,0,0,0,2, ldraw_lib__4_4ring2(realsolid)],
// 1 16 -14 0 0 0 1 0 2 0 0 0 0 2 4-4ring2.dat
  [1,16,-14,0,0,0,1,0,2,0,0,0,0,2, ldraw_lib__4_4ring2(realsolid)],
// 0
// 
];
module ldraw_lib__3111(step=0, col=false, unit=2/5, alt=false, line=0.2, solid=!$preview)
    makepoly(ldraw_lib__3111(solid), step=step, col=col, unit=unit, alt=alt, line=line, solid=solid);
ldraw_lib__3111(line=0.2);
// main file
use <../lib.scad>
use <3111.scad>
$fa=1; $fs=0.2;
function ldraw_lib__34d(realsolid=false) = [
// 0 ~Moved to 3111
// 0 Name: 34d.dat
// 0 Author: [PTadmin]
// 0 !LDRAW_ORG Part UPDATE 2009-01
// 0 !LICENSE Licensed under CC BY 4.0 : see CAreadme.txt
// 
// 0 BFC CERTIFY CCW
  [0,"BFC","CERTIFY"],
  [0,"BFC","CCW"],
// 
// 0 !HISTORY 2009-05-02 [PTadmin] Official Update 2009-01
// 
// 
// 0 // ~Brick 2 x 4 with Wheels Holder Shaft
// 1 16 0 0 0 1 0 0 0 1 0 0 0 1 3111.dat
  [1,16,0,0,0,1,0,0,0,1,0,0,0,1, ldraw_lib__3111(realsolid)],
];
module ldraw_lib__34d(step=0, col=false, unit=2/5, alt=false, line=0.2, solid=!$preview)
    makepoly(ldraw_lib__34d(solid), step=step, col=col, unit=unit, alt=alt, line=line, solid=solid);
ldraw_lib__34d(line=0.2);
